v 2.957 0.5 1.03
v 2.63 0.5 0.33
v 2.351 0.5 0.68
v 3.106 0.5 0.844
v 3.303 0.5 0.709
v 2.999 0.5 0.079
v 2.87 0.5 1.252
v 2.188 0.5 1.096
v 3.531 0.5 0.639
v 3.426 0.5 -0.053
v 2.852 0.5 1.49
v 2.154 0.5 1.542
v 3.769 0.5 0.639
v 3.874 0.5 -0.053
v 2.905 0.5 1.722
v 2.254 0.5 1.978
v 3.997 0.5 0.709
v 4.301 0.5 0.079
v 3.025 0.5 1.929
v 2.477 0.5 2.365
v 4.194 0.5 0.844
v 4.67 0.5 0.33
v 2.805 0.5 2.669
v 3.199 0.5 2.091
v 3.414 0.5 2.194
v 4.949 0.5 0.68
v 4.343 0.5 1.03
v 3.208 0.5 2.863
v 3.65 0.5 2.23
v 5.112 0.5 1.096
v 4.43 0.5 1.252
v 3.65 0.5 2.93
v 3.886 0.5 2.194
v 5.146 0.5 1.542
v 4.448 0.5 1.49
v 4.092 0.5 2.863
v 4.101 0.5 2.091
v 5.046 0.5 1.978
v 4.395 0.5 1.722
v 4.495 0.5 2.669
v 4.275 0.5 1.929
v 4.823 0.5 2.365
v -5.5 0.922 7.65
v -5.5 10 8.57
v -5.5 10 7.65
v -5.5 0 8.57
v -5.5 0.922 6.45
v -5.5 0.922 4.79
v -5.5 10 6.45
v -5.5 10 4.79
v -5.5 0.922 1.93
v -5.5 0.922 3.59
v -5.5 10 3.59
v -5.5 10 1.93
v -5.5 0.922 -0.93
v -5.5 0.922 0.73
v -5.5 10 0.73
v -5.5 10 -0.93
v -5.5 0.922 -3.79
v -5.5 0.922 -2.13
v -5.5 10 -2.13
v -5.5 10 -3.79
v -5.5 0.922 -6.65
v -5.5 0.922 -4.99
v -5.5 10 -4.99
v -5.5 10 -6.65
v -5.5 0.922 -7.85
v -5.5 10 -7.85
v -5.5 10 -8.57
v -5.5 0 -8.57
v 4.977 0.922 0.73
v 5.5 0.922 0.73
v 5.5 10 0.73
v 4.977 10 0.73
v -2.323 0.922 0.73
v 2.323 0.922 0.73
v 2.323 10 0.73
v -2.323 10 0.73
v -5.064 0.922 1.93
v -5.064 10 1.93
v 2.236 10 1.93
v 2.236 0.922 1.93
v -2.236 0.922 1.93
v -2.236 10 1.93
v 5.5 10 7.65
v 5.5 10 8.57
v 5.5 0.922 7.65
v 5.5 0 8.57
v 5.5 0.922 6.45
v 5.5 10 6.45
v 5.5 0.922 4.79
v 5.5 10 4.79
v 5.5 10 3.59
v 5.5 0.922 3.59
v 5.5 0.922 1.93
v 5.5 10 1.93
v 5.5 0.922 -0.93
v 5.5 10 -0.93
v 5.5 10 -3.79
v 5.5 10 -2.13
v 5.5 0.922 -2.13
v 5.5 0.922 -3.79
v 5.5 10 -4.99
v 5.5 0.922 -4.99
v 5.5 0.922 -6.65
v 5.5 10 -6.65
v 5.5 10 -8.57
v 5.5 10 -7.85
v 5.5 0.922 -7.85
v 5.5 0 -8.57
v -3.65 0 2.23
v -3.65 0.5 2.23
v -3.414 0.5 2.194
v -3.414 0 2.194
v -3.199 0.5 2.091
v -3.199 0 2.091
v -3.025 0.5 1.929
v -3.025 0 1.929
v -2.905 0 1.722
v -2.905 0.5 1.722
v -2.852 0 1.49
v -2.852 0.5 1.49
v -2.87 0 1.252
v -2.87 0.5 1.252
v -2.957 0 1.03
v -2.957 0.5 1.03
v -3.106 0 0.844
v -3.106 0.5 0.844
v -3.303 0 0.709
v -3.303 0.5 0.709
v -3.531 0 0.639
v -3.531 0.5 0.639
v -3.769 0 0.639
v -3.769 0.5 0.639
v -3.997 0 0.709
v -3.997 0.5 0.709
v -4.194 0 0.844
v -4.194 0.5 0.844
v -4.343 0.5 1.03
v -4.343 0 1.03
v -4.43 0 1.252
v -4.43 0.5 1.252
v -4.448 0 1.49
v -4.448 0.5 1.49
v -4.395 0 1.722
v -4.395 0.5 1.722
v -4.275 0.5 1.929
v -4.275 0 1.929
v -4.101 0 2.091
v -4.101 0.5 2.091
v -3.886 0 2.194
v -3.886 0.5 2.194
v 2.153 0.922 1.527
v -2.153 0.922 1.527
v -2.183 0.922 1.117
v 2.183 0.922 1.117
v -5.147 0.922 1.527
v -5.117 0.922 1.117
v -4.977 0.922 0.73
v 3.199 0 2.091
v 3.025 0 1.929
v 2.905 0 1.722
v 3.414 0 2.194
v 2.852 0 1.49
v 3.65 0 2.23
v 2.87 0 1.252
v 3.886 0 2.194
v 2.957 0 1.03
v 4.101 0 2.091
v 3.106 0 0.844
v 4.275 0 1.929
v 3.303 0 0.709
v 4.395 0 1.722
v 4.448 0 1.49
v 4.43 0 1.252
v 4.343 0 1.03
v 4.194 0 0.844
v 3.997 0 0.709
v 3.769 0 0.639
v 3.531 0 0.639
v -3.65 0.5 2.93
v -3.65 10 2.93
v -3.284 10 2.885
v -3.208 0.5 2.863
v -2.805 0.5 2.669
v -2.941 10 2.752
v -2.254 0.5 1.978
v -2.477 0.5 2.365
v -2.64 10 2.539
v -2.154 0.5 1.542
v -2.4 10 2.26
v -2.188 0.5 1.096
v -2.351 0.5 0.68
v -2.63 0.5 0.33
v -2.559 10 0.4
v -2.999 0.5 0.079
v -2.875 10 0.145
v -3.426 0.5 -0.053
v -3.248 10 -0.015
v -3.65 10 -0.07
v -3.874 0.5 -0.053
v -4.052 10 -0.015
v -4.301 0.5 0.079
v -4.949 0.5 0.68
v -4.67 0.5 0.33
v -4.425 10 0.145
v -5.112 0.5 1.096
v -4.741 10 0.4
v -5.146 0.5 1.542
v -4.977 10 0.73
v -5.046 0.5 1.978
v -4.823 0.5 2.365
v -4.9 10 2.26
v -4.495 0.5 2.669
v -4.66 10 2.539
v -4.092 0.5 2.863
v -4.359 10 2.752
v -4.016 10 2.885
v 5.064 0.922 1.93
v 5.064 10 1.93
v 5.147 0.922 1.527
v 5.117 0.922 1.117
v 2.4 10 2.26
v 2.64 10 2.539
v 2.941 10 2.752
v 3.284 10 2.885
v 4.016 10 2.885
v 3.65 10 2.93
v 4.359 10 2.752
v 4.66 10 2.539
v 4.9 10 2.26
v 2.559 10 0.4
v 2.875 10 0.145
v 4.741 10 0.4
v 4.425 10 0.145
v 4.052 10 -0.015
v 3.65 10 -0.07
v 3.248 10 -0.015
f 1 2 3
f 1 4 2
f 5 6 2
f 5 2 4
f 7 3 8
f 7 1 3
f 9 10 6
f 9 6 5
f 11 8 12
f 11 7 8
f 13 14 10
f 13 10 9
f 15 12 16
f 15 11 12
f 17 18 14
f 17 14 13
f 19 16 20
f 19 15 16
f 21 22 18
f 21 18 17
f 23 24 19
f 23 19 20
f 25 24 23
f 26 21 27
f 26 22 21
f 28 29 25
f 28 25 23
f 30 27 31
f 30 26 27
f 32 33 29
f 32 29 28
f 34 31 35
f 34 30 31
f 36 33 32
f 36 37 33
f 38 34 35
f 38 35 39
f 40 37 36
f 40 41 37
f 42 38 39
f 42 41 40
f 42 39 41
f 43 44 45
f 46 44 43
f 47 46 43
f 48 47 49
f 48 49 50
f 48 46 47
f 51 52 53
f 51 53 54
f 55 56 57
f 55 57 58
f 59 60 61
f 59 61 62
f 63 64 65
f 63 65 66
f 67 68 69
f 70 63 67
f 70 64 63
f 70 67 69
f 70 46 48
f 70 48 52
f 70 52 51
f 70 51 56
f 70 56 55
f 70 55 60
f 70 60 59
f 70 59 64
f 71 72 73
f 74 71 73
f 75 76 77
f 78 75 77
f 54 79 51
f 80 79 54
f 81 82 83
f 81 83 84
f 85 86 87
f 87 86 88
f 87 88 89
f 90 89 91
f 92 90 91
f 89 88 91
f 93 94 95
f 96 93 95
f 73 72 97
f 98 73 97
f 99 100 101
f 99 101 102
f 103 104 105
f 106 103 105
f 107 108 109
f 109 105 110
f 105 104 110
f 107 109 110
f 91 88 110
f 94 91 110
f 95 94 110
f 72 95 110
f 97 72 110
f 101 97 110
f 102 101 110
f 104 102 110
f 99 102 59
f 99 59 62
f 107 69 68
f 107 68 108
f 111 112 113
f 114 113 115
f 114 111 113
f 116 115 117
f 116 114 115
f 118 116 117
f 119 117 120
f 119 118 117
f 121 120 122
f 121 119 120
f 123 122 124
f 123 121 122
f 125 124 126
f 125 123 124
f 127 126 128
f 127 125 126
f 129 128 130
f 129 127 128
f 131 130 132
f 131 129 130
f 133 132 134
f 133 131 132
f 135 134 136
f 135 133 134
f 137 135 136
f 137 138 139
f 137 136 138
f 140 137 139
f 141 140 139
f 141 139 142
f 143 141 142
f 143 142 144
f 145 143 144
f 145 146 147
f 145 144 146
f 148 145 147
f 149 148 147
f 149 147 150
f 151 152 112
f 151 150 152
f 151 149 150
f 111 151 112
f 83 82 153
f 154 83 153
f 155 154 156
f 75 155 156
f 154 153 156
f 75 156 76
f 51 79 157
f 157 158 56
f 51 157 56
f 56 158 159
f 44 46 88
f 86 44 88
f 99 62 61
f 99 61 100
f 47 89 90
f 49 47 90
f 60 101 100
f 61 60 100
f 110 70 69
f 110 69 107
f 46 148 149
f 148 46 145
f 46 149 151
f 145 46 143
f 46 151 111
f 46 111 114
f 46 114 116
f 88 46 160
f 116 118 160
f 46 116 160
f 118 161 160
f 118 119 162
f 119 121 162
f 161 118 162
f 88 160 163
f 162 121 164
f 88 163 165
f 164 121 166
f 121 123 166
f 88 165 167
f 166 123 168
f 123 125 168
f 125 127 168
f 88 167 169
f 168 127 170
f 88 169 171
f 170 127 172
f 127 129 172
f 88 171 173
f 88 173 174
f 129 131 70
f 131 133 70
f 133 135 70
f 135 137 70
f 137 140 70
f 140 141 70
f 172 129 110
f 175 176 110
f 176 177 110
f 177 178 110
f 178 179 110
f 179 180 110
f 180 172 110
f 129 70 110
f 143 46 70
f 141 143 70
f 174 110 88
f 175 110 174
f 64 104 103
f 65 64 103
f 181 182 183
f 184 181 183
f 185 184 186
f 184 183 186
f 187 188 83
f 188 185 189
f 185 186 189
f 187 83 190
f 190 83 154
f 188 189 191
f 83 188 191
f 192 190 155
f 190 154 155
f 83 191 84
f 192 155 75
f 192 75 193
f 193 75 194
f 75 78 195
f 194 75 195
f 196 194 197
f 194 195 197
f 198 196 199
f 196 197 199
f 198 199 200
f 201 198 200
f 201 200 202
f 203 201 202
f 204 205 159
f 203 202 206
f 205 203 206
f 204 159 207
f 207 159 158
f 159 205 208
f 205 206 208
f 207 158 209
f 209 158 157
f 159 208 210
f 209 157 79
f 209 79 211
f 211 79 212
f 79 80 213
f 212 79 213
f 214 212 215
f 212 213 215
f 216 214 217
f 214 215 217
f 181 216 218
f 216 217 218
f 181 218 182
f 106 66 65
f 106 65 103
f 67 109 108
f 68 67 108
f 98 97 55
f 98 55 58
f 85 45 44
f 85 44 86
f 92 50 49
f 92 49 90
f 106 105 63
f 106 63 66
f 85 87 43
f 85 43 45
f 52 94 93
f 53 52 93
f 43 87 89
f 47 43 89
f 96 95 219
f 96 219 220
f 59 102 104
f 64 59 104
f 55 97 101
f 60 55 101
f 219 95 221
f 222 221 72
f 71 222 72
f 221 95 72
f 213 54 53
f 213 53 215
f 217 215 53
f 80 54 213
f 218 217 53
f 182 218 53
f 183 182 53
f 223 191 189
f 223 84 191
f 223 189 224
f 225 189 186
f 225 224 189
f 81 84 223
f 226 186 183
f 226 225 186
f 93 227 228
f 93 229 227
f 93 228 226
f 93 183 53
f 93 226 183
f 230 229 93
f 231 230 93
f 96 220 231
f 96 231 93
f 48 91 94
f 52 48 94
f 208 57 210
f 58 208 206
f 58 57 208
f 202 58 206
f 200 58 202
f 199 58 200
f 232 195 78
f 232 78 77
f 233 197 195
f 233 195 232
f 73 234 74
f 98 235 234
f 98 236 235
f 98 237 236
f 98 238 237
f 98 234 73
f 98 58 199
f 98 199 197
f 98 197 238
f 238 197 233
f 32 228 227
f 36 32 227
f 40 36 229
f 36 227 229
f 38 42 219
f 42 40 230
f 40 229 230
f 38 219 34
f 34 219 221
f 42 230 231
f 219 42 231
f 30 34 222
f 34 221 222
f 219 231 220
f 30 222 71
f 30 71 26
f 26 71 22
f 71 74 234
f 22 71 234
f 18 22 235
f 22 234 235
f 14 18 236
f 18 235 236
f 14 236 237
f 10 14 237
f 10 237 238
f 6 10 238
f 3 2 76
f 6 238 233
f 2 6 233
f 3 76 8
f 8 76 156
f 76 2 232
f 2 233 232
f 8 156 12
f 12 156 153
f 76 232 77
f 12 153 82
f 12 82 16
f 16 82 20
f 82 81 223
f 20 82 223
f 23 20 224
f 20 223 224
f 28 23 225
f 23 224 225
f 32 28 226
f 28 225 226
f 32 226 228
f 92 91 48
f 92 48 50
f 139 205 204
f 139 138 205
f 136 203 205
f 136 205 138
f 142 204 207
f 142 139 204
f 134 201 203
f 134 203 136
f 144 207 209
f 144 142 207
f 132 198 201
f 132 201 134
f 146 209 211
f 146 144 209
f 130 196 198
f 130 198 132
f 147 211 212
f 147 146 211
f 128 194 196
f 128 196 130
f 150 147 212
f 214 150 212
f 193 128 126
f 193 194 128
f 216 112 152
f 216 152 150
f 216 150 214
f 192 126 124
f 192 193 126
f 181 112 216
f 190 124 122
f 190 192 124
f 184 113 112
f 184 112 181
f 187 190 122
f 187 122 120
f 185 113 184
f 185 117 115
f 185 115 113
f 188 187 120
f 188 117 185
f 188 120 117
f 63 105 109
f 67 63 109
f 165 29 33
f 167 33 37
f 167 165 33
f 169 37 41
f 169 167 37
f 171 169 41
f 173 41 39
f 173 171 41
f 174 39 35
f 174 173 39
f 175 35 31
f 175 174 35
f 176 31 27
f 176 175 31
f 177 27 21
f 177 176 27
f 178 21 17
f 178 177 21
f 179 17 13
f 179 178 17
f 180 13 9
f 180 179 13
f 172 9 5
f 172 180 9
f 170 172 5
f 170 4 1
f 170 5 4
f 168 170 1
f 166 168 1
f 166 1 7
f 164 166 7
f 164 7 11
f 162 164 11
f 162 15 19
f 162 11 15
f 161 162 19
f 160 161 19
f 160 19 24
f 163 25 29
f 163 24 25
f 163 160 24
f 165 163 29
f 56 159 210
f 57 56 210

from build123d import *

# Parameters (mm, degrees)
SKETCH1_W           = 11
SKETCH1_H           = 17.14
SKETCH1_R           = 0.8
BOSS_EXTRUDE1_DEPTH = 10
SKETCH3_W           = 1.2
SKETCH3_H           = 9.077755084
CUT_EXTRUDE1_DEPTH  = 18.159396843
SKETCH4_R           = 1.5
CUT_EXTRUDE2_DEPTH  = 9.5


with BuildPart() as part:
    # Sketch1 → Boss-Extrude1 (new body)
    with BuildSketch(Plane(origin=(0, 0, 0), x_dir=(1, 0, 0), z_dir=(0, 1, 0))):
        Rectangle(SKETCH1_W, SKETCH1_H)
        with Locations(Location((3.65, -1.43, 0), (0, 0, 270))):
            Circle(SKETCH1_R, mode=Mode.SUBTRACT)
        with Locations(Location((-3.65, -1.43, 0), (0, 0, 270))):
            Circle(SKETCH1_R, mode=Mode.SUBTRACT)
    extrude(amount=BOSS_EXTRUDE1_DEPTH)

    # Sketch3 → Cut-Extrude1 (cut, through all)
    with BuildSketch(Plane(origin=(5.5, 0, 0), x_dir=(0, 0, -1), z_dir=(1, 0, 0))):
        with Locations((-4.19, 5.461122458)):
            Rectangle(SKETCH3_W, SKETCH3_H)
        with Locations((-7.05, 5.461122458)):
            Rectangle(SKETCH3_W, SKETCH3_H)
        with Locations((-1.33, 5.461122458)):
            Rectangle(SKETCH3_W, SKETCH3_H)
        with Locations((1.53, 5.461122458)):
            Rectangle(SKETCH3_W, SKETCH3_H)
        with Locations((4.39, 5.461122458)):
            Rectangle(SKETCH3_W, SKETCH3_H)
        with Locations((7.25, 5.461122458)):
            Rectangle(SKETCH3_W, SKETCH3_H)
    extrude(amount=-CUT_EXTRUDE1_DEPTH, mode=Mode.SUBTRACT)

    # Sketch4 → Cut-Extrude2 (cut)
    with BuildSketch(Plane(origin=(0, 10, 0), x_dir=(1, 0, 0), z_dir=(0, 1, 0))):
        with Locations(Location((-3.65, -1.43, 0), (0, 0, 270))):
            Circle(SKETCH4_R)
        with Locations(Location((3.65, -1.43, 0), (0, 0, 270))):
            Circle(SKETCH4_R)
    extrude(amount=-CUT_EXTRUDE2_DEPTH, mode=Mode.SUBTRACT)


solid = part.part
